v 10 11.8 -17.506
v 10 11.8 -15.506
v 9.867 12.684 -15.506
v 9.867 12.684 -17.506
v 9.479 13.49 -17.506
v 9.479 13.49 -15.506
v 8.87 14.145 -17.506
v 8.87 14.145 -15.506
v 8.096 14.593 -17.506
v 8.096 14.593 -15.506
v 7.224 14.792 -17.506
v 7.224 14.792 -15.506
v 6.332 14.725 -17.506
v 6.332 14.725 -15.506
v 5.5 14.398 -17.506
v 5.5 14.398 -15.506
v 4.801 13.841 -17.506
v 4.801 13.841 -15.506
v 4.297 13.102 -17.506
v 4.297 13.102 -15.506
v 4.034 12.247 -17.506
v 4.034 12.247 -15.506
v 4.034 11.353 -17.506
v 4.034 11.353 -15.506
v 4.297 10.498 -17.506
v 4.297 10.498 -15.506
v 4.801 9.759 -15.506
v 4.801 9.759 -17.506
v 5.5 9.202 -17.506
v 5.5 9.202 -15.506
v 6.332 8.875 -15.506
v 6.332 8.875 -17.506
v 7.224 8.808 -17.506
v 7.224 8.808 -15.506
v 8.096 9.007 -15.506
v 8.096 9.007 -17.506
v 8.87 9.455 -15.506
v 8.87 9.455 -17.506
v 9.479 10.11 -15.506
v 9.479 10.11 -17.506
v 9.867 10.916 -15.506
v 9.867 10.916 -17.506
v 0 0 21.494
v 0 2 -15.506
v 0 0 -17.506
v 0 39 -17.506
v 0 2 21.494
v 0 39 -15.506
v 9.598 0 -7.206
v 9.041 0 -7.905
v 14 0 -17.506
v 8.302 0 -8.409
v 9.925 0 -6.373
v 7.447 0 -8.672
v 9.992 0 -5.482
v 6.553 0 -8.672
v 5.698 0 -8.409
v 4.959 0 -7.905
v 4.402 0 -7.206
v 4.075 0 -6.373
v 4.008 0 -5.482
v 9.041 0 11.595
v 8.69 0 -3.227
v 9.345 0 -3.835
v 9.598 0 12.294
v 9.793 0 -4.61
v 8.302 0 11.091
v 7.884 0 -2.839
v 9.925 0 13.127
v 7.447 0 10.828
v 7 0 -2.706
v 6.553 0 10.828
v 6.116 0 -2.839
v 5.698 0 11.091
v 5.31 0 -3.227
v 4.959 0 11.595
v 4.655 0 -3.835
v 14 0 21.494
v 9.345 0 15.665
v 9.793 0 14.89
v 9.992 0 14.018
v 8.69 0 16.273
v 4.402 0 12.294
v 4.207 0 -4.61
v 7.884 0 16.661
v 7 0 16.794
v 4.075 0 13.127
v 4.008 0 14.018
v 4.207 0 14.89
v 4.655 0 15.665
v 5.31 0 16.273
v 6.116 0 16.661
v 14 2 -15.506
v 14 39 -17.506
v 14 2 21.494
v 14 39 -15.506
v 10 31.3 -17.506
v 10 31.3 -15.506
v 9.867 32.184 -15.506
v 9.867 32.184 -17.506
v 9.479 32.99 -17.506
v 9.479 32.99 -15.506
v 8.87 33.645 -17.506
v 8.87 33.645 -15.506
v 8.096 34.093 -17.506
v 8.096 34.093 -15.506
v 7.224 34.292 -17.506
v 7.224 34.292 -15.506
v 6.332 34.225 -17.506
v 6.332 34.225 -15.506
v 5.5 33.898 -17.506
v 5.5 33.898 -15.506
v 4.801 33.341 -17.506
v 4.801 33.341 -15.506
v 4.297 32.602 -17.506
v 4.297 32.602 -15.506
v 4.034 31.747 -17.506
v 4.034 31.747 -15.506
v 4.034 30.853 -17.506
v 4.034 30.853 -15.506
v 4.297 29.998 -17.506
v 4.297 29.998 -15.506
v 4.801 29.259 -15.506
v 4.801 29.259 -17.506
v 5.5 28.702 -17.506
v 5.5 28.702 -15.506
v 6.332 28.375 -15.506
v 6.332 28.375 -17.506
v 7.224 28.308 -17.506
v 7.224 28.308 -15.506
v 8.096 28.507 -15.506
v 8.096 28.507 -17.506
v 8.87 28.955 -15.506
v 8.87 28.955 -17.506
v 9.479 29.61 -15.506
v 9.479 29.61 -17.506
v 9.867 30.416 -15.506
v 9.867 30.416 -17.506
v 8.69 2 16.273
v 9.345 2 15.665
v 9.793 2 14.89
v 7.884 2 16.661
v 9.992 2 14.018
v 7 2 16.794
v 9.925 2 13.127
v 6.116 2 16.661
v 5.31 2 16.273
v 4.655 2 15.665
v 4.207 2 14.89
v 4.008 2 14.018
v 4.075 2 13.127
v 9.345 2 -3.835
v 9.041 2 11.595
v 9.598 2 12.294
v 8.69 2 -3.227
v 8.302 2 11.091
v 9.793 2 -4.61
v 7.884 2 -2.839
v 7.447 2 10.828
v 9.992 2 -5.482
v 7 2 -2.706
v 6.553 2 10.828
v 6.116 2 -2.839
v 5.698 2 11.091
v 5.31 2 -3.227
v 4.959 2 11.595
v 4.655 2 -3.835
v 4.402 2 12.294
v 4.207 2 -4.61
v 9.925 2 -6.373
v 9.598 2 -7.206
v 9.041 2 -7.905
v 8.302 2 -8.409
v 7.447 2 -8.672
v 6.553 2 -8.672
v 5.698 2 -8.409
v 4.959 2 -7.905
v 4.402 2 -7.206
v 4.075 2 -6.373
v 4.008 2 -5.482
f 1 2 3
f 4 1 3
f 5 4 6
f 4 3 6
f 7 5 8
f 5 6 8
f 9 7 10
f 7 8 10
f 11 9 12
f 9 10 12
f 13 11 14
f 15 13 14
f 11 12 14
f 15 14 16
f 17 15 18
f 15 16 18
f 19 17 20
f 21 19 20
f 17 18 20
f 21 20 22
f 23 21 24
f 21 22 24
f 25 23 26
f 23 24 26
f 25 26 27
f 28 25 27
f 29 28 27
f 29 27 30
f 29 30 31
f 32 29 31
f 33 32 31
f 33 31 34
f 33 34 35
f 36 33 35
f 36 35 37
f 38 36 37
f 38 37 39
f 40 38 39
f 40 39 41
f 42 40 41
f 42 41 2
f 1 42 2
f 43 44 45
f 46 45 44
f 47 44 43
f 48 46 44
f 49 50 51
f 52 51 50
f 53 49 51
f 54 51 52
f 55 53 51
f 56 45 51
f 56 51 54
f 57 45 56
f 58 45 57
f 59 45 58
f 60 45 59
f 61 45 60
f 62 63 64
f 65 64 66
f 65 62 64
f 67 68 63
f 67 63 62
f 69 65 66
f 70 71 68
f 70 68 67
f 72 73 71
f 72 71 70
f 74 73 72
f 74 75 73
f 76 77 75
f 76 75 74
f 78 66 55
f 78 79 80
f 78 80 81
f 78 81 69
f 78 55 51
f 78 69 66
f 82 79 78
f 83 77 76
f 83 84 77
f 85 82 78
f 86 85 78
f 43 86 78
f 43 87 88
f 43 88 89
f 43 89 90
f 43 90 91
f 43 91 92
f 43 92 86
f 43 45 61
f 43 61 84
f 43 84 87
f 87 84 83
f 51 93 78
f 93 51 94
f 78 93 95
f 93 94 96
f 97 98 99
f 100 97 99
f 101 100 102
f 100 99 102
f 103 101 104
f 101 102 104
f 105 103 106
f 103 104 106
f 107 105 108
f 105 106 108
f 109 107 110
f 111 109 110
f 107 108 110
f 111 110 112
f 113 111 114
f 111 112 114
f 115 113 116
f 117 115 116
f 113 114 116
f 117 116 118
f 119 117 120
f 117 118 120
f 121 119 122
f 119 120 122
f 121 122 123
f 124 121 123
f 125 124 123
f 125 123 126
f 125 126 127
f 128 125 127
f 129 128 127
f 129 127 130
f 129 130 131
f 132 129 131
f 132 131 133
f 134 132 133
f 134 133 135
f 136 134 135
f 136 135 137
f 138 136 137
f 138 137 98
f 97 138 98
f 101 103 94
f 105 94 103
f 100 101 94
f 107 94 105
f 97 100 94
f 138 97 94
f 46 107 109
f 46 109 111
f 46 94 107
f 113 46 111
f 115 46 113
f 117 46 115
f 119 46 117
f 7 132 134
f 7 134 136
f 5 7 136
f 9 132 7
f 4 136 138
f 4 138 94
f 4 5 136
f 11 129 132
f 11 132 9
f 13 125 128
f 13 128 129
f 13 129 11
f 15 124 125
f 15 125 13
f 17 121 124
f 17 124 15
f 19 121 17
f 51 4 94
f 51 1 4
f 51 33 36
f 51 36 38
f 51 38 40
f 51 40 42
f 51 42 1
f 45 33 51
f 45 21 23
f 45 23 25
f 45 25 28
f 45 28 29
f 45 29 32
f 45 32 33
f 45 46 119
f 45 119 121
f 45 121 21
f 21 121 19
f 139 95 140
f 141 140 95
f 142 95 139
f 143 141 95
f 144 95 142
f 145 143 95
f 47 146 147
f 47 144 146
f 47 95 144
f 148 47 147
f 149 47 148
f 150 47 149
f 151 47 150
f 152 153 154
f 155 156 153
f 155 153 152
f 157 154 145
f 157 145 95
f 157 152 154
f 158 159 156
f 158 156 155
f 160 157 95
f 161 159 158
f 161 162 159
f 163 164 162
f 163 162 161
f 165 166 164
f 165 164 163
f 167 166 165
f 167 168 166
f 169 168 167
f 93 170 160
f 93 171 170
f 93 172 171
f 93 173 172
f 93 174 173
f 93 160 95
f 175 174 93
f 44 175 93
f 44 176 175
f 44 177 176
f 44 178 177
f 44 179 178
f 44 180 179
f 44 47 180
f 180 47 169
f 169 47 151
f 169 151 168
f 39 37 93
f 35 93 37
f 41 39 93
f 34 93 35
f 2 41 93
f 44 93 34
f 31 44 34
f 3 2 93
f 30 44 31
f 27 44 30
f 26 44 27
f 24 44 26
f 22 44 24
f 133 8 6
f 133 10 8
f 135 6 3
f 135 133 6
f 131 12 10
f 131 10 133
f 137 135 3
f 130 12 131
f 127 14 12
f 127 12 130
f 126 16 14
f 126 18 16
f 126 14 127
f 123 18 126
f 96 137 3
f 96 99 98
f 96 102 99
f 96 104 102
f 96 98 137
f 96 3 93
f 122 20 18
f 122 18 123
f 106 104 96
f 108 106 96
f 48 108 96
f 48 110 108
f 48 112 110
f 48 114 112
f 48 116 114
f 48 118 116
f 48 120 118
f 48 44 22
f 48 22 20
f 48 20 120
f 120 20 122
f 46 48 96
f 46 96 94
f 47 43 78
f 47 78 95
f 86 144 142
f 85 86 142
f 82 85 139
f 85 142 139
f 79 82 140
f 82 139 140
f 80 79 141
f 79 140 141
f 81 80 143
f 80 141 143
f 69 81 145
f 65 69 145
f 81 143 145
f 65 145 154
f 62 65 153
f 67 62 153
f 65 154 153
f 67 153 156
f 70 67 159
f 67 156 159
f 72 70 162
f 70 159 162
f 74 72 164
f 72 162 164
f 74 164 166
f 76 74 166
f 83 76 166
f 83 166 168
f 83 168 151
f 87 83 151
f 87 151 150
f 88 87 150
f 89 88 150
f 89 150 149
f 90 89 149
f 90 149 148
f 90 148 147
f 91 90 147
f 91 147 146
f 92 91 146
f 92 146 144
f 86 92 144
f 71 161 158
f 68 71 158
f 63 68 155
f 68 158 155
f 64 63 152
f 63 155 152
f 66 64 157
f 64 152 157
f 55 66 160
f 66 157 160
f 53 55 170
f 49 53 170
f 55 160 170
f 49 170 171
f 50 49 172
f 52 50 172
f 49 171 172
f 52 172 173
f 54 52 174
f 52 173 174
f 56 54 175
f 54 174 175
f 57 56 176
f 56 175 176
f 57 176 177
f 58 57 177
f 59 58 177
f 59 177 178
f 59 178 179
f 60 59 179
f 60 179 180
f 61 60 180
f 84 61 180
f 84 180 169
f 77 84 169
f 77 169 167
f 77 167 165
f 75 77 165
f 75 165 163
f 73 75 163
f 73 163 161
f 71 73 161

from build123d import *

# Parameters (mm, degrees)
BOSS_EXTRUDE1_DEPTH = 14
SKETCH2_R           = 3
CUT_EXTRUDE1_DEPTH  = 46.02225292
SKETCH3_R           = 3
CUT_EXTRUDE2_DEPTH  = 56.551777649


with BuildPart() as part:
    # Sketch1 → Boss-Extrude1 (new body)
    with BuildSketch(Plane(origin=(0, 0, 0), x_dir=(0, 0, -1), z_dir=(1, 0, 0))):
        Polygon((-21.494261048, 2), (15.505738952, 2), (15.505738952, 39), (17.505738952, 39), (17.505738952, 0), (-21.494261048, 0), align=None)
    extrude(amount=BOSS_EXTRUDE1_DEPTH)

    # Sketch2 → Cut-Extrude1 (cut, through all)
    with BuildSketch(Plane(origin=(0, 2, 0), x_dir=(1, 0, 0), z_dir=(0, 1, 0))):
        with Locations(Location((7, -13.794261048, 0), (0, 0, 270))):
            Circle(SKETCH2_R)
        with Locations(Location((7, 5.705738952, 0), (0, 0, 270))):
            Circle(SKETCH2_R)
    extrude(amount=-CUT_EXTRUDE1_DEPTH, mode=Mode.SUBTRACT)

    # Sketch3 → Cut-Extrude2 (cut, through all)
    with BuildSketch(Plane.XY.offset(-15.505738952)):
        with Locations((7, 11.8)):
            Circle(SKETCH3_R)
        with Locations((7, 31.3)):
            Circle(SKETCH3_R)
    extrude(amount=-CUT_EXTRUDE2_DEPTH, mode=Mode.SUBTRACT)


solid = part.part
